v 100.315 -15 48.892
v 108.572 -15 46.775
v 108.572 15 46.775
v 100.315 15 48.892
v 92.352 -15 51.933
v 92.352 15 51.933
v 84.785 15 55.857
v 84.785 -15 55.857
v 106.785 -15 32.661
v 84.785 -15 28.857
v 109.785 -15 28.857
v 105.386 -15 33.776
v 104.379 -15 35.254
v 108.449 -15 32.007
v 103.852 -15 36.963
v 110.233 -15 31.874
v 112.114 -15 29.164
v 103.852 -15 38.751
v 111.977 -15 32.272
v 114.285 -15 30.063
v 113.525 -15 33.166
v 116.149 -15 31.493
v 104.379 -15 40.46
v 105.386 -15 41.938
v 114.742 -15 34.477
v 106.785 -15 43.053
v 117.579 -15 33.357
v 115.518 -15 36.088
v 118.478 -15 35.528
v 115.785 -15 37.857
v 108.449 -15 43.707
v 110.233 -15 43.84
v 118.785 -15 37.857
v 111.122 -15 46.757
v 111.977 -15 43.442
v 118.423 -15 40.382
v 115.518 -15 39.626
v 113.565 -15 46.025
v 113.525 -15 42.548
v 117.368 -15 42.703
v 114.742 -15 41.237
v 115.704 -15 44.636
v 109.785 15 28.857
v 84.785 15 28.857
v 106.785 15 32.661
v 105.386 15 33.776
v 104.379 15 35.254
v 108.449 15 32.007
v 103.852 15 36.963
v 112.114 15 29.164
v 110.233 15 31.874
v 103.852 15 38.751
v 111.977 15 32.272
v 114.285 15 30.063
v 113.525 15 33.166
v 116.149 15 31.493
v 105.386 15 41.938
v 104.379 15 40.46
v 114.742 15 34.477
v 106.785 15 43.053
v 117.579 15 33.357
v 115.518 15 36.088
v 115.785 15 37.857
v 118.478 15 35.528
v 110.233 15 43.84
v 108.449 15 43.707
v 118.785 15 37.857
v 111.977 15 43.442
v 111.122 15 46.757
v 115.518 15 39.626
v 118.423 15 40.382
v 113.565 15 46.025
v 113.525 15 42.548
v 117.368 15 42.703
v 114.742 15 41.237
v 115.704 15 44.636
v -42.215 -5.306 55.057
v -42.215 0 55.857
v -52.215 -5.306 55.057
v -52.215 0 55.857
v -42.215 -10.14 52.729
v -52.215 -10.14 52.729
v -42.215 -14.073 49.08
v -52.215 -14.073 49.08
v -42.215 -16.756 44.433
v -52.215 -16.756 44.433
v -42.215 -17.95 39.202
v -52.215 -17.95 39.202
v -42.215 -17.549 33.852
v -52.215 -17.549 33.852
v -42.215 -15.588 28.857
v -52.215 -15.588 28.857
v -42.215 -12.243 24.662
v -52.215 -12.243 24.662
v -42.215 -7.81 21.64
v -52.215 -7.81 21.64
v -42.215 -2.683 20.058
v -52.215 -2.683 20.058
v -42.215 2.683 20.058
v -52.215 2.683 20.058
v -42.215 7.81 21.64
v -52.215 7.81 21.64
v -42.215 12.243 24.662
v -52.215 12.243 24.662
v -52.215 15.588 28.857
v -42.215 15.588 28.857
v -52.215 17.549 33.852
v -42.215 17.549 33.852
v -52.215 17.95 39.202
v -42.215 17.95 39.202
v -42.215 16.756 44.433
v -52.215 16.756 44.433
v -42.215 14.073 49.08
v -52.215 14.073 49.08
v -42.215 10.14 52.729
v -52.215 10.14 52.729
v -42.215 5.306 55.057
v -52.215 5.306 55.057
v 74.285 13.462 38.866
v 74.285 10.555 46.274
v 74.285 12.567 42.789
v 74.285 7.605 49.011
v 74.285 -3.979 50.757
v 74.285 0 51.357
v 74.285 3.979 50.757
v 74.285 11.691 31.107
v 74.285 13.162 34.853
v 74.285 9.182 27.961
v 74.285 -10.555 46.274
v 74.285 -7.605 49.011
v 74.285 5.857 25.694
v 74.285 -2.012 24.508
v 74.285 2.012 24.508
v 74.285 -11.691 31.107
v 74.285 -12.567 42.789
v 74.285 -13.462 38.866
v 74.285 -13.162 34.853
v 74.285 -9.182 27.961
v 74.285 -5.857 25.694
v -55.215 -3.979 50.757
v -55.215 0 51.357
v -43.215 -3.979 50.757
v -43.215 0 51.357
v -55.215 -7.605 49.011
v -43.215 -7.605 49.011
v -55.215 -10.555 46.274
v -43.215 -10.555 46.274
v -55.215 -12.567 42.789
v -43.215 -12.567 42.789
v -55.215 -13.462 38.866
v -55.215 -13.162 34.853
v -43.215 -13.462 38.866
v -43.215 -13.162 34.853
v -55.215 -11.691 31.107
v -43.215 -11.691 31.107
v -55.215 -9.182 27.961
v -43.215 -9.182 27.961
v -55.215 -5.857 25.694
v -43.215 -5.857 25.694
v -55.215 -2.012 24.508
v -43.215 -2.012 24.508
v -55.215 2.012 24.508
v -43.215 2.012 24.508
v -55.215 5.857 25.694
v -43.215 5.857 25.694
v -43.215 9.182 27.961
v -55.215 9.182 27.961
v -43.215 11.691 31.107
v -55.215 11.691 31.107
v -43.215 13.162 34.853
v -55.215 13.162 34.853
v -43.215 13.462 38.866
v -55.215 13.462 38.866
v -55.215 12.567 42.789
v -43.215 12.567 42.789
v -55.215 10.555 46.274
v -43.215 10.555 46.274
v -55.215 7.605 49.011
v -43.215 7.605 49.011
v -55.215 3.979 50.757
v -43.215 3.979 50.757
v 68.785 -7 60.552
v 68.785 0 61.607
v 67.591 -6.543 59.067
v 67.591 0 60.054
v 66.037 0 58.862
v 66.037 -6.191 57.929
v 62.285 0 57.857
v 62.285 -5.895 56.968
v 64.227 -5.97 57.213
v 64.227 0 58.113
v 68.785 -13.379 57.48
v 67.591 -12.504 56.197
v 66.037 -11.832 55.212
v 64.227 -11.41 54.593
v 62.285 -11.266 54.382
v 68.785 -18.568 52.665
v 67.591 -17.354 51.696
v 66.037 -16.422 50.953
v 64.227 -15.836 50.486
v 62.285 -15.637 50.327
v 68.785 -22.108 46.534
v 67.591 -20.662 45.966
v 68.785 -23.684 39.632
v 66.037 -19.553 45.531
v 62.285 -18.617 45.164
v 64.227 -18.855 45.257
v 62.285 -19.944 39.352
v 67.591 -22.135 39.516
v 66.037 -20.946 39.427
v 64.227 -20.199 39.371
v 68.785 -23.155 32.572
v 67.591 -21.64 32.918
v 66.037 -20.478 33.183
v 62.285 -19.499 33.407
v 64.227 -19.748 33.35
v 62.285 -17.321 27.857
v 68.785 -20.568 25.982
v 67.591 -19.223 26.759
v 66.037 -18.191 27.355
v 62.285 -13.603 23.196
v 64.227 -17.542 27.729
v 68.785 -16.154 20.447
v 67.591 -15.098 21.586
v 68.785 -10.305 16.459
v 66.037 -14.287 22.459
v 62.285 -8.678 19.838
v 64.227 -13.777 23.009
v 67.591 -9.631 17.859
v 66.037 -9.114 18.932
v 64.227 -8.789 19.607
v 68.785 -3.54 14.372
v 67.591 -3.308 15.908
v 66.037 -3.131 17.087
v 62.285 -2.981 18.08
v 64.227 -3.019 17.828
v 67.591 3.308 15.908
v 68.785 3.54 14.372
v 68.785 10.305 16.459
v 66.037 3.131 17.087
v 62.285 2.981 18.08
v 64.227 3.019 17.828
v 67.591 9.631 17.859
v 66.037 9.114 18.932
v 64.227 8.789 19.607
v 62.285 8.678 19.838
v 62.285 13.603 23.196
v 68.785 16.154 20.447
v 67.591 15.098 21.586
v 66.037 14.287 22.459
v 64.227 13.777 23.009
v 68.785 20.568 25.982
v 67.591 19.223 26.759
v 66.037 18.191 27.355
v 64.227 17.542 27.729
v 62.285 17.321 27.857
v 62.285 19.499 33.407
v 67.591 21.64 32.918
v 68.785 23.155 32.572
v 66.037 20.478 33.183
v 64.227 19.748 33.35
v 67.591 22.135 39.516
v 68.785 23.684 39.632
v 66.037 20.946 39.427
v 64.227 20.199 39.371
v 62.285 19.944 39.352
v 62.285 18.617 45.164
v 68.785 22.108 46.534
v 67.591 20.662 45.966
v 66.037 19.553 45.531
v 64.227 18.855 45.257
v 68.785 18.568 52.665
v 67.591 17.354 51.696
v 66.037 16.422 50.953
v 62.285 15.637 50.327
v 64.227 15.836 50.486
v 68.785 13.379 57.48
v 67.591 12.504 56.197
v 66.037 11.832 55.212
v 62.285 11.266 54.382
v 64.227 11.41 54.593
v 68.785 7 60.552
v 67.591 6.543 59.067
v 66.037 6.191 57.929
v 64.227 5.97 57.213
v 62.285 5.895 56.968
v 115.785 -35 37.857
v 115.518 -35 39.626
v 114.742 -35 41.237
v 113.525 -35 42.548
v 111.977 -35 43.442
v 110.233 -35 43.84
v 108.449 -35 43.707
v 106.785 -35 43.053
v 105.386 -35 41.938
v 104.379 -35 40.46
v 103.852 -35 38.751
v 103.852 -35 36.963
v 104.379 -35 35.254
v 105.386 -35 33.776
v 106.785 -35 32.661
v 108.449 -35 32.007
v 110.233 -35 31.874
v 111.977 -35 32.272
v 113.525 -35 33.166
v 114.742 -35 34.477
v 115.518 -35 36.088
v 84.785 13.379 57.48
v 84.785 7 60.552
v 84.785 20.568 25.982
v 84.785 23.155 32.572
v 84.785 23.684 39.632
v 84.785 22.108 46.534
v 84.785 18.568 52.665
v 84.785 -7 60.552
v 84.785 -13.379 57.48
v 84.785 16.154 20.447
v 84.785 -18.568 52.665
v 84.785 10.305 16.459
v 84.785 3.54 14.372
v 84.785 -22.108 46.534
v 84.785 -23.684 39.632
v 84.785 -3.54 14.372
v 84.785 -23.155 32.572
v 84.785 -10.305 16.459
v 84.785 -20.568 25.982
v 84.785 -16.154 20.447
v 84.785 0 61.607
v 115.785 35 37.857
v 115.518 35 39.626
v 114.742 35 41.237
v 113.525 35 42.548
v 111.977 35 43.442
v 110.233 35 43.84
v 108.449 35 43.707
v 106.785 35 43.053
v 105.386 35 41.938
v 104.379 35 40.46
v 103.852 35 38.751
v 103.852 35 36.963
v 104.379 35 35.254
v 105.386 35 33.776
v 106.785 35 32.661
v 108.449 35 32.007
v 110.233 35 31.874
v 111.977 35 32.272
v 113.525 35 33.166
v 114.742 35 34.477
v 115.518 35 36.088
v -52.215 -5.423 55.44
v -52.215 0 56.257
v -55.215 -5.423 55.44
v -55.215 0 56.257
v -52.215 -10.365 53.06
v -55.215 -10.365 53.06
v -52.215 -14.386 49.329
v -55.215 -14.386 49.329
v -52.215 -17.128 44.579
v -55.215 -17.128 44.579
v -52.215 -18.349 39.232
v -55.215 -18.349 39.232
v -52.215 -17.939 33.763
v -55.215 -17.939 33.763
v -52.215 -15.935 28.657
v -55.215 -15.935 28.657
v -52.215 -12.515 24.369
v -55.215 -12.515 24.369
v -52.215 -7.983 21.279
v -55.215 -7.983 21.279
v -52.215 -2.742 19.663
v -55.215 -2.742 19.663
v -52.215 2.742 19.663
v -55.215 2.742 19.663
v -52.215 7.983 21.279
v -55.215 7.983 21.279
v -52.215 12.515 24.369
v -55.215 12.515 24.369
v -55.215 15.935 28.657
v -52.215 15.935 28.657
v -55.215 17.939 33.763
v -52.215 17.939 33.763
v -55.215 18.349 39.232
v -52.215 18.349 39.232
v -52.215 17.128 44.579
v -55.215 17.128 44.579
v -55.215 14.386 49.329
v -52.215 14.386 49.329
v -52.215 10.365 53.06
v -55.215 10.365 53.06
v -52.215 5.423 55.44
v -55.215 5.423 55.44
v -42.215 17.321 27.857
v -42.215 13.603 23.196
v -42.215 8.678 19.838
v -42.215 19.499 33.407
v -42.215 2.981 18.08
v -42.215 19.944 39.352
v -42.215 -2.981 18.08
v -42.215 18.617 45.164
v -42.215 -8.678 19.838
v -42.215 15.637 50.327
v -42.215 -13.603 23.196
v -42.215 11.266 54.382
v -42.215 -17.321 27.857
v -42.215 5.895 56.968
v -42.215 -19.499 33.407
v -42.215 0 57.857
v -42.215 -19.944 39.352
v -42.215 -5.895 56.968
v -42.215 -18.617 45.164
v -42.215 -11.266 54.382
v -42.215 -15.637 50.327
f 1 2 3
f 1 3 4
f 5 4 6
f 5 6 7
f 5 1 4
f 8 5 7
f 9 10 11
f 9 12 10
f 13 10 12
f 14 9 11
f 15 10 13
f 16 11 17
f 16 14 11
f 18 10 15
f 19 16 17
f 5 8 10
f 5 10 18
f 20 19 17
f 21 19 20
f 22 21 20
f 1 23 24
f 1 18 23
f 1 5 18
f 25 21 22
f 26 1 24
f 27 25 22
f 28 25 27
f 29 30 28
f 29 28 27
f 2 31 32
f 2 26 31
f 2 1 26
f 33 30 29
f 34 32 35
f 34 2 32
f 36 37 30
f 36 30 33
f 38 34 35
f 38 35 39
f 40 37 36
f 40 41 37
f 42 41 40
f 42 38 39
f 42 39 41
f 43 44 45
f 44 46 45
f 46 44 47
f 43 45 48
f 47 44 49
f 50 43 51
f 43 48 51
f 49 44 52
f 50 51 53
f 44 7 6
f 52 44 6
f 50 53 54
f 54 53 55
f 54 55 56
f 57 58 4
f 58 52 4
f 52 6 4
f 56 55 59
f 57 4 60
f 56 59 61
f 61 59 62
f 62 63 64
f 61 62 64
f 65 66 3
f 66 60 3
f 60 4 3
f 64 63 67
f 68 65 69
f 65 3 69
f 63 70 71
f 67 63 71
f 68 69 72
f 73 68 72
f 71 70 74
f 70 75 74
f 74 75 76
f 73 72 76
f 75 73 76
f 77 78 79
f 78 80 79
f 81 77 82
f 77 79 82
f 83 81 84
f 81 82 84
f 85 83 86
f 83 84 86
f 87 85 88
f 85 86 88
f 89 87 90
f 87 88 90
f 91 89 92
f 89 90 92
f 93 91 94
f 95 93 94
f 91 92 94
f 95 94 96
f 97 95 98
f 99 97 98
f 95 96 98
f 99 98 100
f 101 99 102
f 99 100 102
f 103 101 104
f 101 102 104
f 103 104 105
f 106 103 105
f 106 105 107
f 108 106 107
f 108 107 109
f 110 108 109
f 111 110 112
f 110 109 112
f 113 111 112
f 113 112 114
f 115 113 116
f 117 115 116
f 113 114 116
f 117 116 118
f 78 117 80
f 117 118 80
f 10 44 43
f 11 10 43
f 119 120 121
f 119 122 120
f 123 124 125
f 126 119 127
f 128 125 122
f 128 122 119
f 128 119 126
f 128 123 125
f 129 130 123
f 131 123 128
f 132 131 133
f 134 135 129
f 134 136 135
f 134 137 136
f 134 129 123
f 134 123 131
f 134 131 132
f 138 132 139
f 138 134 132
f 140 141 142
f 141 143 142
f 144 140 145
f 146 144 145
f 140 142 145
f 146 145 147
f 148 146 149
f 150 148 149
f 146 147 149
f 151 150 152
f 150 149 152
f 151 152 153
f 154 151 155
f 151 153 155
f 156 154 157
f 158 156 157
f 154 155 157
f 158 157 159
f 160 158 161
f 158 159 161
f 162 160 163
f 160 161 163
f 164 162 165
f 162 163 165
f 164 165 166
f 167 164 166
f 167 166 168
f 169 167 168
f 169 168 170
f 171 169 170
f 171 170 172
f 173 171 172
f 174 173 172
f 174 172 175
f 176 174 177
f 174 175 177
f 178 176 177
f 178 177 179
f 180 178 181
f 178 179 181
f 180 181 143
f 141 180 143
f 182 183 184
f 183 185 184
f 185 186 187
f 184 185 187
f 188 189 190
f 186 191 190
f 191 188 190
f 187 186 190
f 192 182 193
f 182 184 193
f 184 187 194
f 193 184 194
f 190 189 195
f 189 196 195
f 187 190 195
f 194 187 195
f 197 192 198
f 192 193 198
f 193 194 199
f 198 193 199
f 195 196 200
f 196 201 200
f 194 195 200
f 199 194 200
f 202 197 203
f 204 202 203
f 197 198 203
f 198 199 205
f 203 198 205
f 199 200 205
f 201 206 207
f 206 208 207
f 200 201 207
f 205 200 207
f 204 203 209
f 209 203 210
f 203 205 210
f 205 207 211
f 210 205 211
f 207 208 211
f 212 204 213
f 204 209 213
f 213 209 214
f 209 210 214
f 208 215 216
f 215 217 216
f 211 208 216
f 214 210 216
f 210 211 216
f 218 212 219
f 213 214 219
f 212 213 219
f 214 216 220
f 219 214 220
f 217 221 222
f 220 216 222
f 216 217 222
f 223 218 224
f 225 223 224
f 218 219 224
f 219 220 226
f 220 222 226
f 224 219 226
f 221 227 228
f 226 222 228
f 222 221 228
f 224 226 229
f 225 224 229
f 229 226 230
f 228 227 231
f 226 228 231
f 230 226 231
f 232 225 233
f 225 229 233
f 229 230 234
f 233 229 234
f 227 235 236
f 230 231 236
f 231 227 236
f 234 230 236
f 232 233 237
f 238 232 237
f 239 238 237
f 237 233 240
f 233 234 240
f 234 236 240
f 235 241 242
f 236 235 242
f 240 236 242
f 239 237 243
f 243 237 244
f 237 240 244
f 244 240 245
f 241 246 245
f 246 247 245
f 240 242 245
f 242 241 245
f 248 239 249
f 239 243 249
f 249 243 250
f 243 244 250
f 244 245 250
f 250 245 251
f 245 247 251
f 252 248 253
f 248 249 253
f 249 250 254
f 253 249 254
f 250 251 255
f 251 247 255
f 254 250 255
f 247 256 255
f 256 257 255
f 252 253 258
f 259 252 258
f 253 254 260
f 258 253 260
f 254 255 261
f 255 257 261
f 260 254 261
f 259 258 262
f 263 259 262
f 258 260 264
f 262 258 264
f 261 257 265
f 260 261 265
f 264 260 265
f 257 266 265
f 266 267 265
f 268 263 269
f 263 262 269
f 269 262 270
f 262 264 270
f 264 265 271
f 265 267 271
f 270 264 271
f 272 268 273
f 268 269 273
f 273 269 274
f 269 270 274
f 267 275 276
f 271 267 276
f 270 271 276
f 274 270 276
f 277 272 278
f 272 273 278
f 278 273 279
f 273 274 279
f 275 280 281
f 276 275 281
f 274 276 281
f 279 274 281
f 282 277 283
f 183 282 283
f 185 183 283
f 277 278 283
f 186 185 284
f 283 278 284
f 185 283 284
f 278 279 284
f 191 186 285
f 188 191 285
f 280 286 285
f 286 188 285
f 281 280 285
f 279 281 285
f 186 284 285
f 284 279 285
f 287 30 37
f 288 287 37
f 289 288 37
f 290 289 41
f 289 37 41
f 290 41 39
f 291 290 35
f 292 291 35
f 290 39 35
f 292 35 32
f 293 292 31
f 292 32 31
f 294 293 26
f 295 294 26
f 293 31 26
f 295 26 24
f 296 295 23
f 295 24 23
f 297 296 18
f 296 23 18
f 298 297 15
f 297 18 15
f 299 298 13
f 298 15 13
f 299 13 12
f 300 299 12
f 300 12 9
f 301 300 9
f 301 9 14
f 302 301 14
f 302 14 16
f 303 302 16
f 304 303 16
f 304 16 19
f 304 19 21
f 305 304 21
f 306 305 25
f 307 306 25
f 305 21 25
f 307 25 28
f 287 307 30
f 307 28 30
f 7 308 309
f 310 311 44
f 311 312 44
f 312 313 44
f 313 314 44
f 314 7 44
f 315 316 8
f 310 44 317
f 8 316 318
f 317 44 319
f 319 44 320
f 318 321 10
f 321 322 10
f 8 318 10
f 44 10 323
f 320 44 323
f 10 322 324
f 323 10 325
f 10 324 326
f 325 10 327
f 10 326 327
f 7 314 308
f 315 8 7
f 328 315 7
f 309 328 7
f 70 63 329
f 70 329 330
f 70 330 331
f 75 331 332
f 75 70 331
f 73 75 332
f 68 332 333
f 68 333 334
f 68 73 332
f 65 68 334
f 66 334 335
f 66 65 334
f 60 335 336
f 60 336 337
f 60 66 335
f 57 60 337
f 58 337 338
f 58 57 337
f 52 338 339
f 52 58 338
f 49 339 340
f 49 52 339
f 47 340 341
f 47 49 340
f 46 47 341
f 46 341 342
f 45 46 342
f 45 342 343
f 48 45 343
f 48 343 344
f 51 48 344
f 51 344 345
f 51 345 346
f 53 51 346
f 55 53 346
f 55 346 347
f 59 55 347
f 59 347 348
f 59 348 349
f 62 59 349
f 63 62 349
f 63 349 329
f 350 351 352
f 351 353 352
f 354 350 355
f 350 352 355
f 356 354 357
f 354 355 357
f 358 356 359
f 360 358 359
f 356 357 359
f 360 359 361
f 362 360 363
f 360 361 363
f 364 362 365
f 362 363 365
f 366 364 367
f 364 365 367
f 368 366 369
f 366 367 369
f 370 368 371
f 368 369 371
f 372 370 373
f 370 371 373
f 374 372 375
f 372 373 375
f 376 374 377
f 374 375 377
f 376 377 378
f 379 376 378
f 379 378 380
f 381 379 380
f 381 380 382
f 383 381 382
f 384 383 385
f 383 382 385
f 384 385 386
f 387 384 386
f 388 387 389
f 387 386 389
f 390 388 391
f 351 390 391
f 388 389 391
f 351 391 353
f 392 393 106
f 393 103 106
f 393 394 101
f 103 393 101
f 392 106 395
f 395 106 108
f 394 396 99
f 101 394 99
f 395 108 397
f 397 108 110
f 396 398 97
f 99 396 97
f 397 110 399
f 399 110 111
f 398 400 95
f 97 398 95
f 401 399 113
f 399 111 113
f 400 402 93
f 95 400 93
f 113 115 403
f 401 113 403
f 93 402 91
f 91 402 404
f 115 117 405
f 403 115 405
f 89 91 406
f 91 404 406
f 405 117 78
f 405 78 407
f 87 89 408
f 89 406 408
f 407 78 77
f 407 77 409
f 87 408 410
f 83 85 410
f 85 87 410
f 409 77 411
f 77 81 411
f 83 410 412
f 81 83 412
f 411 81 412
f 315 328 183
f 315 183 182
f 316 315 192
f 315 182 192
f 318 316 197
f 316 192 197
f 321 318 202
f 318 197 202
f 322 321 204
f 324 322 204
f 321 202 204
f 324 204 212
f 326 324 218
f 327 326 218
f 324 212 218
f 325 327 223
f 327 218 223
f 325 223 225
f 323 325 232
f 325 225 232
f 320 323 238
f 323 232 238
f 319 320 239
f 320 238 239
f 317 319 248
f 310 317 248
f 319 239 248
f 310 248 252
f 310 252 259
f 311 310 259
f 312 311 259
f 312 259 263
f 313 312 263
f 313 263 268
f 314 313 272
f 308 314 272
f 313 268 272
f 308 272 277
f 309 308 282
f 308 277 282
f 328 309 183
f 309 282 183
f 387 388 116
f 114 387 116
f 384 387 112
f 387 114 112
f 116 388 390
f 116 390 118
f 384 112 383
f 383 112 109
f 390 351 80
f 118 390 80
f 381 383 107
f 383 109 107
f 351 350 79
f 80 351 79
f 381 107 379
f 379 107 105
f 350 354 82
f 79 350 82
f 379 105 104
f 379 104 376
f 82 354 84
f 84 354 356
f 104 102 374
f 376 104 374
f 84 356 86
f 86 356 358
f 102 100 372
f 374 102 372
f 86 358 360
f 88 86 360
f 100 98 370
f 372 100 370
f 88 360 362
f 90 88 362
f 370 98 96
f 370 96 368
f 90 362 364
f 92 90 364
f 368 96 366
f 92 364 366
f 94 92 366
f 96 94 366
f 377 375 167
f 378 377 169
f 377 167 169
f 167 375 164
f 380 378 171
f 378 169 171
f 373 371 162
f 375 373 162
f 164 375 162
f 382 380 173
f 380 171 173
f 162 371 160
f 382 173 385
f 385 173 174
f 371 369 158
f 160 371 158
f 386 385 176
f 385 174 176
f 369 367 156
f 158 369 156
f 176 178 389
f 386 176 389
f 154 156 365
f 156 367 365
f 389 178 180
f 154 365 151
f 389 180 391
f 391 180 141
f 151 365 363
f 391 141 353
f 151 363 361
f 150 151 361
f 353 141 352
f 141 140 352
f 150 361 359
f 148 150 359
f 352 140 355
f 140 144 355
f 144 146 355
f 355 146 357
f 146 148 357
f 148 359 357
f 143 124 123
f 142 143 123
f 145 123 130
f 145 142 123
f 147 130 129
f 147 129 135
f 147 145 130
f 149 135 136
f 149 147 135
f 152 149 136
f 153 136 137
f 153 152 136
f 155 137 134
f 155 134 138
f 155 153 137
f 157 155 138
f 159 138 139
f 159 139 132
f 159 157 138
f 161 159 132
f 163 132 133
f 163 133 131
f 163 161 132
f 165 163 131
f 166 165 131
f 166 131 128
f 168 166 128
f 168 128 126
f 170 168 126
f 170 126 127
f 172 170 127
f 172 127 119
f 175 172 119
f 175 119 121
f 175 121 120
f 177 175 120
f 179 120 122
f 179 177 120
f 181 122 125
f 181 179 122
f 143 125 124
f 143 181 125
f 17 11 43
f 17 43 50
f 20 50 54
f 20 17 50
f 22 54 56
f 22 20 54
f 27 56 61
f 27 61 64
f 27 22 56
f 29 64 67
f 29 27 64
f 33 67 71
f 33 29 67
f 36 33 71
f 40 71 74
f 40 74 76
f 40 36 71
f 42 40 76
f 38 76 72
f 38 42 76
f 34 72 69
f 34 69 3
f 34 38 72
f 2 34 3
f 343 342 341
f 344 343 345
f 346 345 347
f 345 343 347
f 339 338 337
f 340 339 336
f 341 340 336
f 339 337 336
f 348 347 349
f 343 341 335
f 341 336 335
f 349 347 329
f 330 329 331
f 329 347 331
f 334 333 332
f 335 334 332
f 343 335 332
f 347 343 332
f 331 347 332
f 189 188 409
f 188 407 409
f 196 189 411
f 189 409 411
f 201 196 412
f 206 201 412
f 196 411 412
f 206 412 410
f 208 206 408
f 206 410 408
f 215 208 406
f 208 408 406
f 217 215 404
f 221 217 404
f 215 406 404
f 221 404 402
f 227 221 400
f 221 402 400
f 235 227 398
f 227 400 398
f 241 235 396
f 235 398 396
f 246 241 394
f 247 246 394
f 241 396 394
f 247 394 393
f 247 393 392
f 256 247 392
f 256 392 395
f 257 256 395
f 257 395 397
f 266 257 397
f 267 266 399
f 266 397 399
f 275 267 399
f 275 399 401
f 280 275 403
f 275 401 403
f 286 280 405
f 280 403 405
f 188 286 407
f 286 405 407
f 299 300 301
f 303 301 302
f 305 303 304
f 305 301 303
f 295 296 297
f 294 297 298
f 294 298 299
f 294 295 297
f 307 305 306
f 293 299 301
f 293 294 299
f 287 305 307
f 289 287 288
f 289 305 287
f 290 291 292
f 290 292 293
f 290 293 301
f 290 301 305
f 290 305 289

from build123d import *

# Parameters (mm, degrees)
F0_W     = 112
F0_H     = 13.5
F2_DEPTH = 117.5
F3_DEPTH = 15
F4_R     = 6
F5_DEPTH = 20
F6_DEPTH = 70


with BuildPart() as f1:
    # F0 (on Front) → F1 (revolve)
    with BuildSketch(Plane.XZ):
        with BuildLine():
            Line((84.7845596923, 37.8570006367), (84.7845596923, 55.8570006367))
            Line((84.7845596923, 55.8570006367), (84.7845596923, 61.6070006367))
            Line((84.7845596923, 61.6070006367), (68.7845596923, 61.6070006367))
            ThreePointArc((68.7845596923, 61.6070006367), (66.0366424473, 58.8617238614), (62.2845596923, 57.8570006367))
            Line((62.2845596923, 57.8570006367), (-42.2154403077, 57.8570006367))
            Line((-42.2154403077, 57.8570006367), (-42.2154403077, 55.8570006367))
            Line((-42.2154403077, 55.8570006367), (-52.2154403077, 55.8570006367))
            Line((-52.2154403077, 55.8570006367), (-52.2154403077, 56.2570006367))
            Line((-52.2154403077, 56.2570006367), (-55.2154403077, 56.2570006367))
            Line((-55.2154403077, 56.2570006367), (-55.2154403077, 51.3570006367))
            Line((-55.2154403077, 51.3570006367), (-43.2154403077, 51.3570006367))
            Line((-43.2154403077, 51.3570006367), (68.7845596923, 51.3570006367))
            Line((68.7845596923, 51.3570006367), (68.7845596923, 37.8570006367))
            Line((68.7845596923, 37.8570006367), (84.7845596923, 37.8570006367))
        make_face()
        with Locations((12.7845596923, 44.6070006367)):
            Rectangle(F0_W, F0_H)
    revolve(axis=Axis((14.7845596923, 0, 37.8570006367), (1, 0, 0)))

    # F2 (cut): a face of the model
    f2_faces = [f1.faces().sort_by_distance(p)[0] for p in [
        (-43.2154403077, 0, 37.8570006367),
    ]]
    extrude(f2_faces, amount=-F2_DEPTH, mode=Mode.SUBTRACT)

    # F0 (on Front) → F3 (join, symmetric)
    with BuildSketch(Plane.XZ):
        with BuildLine():
            Line((84.7845596923, 28.8570006367), (109.7845596923, 28.8570006367))
            ThreePointArc((109.7845596923, 28.8570006367), (100.8051004109, 37.2492909907), (108.5719143545, 46.7749315225))
            ThreePointArc((108.5719143545, 46.7749315225), (96.2900045696, 50.299124768), (84.7845596923, 55.8570006367))
            Line((84.7845596923, 55.8570006367), (84.7845596923, 37.8570006367))
            Line((84.7845596923, 37.8570006367), (84.7845596923, 28.8570006367))
        make_face()
        with BuildLine():
            ThreePointArc((108.5719143545, 46.7749315225), (100.8051004109, 37.2492909907), (109.7845596923, 28.8570006367))
            ThreePointArc((109.7845596923, 28.8570006367), (116.148520723, 31.493039606), (118.7845596923, 37.8570006367))
            ThreePointArc((118.7845596923, 37.8570006367), (115.70428063, 44.6361527975), (108.5719143545, 46.7749315225))
        make_face()
    extrude(amount=F3_DEPTH, both=True)

    # F4 (on face) → F5 (join)
    with BuildSketch(Plane.XZ.offset(15)):
        with Locations((109.7845596923, 37.8570006367)):
            Circle(F4_R)
    extrude(amount=F5_DEPTH)

    # F6 (add): a face of the model
    f6_faces = [f1.faces().sort_by_distance(p)[0] for p in [
        (109.7845596923, -35, 37.8570006367),
    ]]
    extrude(f6_faces, amount=-F6_DEPTH)


solid = f1.part
